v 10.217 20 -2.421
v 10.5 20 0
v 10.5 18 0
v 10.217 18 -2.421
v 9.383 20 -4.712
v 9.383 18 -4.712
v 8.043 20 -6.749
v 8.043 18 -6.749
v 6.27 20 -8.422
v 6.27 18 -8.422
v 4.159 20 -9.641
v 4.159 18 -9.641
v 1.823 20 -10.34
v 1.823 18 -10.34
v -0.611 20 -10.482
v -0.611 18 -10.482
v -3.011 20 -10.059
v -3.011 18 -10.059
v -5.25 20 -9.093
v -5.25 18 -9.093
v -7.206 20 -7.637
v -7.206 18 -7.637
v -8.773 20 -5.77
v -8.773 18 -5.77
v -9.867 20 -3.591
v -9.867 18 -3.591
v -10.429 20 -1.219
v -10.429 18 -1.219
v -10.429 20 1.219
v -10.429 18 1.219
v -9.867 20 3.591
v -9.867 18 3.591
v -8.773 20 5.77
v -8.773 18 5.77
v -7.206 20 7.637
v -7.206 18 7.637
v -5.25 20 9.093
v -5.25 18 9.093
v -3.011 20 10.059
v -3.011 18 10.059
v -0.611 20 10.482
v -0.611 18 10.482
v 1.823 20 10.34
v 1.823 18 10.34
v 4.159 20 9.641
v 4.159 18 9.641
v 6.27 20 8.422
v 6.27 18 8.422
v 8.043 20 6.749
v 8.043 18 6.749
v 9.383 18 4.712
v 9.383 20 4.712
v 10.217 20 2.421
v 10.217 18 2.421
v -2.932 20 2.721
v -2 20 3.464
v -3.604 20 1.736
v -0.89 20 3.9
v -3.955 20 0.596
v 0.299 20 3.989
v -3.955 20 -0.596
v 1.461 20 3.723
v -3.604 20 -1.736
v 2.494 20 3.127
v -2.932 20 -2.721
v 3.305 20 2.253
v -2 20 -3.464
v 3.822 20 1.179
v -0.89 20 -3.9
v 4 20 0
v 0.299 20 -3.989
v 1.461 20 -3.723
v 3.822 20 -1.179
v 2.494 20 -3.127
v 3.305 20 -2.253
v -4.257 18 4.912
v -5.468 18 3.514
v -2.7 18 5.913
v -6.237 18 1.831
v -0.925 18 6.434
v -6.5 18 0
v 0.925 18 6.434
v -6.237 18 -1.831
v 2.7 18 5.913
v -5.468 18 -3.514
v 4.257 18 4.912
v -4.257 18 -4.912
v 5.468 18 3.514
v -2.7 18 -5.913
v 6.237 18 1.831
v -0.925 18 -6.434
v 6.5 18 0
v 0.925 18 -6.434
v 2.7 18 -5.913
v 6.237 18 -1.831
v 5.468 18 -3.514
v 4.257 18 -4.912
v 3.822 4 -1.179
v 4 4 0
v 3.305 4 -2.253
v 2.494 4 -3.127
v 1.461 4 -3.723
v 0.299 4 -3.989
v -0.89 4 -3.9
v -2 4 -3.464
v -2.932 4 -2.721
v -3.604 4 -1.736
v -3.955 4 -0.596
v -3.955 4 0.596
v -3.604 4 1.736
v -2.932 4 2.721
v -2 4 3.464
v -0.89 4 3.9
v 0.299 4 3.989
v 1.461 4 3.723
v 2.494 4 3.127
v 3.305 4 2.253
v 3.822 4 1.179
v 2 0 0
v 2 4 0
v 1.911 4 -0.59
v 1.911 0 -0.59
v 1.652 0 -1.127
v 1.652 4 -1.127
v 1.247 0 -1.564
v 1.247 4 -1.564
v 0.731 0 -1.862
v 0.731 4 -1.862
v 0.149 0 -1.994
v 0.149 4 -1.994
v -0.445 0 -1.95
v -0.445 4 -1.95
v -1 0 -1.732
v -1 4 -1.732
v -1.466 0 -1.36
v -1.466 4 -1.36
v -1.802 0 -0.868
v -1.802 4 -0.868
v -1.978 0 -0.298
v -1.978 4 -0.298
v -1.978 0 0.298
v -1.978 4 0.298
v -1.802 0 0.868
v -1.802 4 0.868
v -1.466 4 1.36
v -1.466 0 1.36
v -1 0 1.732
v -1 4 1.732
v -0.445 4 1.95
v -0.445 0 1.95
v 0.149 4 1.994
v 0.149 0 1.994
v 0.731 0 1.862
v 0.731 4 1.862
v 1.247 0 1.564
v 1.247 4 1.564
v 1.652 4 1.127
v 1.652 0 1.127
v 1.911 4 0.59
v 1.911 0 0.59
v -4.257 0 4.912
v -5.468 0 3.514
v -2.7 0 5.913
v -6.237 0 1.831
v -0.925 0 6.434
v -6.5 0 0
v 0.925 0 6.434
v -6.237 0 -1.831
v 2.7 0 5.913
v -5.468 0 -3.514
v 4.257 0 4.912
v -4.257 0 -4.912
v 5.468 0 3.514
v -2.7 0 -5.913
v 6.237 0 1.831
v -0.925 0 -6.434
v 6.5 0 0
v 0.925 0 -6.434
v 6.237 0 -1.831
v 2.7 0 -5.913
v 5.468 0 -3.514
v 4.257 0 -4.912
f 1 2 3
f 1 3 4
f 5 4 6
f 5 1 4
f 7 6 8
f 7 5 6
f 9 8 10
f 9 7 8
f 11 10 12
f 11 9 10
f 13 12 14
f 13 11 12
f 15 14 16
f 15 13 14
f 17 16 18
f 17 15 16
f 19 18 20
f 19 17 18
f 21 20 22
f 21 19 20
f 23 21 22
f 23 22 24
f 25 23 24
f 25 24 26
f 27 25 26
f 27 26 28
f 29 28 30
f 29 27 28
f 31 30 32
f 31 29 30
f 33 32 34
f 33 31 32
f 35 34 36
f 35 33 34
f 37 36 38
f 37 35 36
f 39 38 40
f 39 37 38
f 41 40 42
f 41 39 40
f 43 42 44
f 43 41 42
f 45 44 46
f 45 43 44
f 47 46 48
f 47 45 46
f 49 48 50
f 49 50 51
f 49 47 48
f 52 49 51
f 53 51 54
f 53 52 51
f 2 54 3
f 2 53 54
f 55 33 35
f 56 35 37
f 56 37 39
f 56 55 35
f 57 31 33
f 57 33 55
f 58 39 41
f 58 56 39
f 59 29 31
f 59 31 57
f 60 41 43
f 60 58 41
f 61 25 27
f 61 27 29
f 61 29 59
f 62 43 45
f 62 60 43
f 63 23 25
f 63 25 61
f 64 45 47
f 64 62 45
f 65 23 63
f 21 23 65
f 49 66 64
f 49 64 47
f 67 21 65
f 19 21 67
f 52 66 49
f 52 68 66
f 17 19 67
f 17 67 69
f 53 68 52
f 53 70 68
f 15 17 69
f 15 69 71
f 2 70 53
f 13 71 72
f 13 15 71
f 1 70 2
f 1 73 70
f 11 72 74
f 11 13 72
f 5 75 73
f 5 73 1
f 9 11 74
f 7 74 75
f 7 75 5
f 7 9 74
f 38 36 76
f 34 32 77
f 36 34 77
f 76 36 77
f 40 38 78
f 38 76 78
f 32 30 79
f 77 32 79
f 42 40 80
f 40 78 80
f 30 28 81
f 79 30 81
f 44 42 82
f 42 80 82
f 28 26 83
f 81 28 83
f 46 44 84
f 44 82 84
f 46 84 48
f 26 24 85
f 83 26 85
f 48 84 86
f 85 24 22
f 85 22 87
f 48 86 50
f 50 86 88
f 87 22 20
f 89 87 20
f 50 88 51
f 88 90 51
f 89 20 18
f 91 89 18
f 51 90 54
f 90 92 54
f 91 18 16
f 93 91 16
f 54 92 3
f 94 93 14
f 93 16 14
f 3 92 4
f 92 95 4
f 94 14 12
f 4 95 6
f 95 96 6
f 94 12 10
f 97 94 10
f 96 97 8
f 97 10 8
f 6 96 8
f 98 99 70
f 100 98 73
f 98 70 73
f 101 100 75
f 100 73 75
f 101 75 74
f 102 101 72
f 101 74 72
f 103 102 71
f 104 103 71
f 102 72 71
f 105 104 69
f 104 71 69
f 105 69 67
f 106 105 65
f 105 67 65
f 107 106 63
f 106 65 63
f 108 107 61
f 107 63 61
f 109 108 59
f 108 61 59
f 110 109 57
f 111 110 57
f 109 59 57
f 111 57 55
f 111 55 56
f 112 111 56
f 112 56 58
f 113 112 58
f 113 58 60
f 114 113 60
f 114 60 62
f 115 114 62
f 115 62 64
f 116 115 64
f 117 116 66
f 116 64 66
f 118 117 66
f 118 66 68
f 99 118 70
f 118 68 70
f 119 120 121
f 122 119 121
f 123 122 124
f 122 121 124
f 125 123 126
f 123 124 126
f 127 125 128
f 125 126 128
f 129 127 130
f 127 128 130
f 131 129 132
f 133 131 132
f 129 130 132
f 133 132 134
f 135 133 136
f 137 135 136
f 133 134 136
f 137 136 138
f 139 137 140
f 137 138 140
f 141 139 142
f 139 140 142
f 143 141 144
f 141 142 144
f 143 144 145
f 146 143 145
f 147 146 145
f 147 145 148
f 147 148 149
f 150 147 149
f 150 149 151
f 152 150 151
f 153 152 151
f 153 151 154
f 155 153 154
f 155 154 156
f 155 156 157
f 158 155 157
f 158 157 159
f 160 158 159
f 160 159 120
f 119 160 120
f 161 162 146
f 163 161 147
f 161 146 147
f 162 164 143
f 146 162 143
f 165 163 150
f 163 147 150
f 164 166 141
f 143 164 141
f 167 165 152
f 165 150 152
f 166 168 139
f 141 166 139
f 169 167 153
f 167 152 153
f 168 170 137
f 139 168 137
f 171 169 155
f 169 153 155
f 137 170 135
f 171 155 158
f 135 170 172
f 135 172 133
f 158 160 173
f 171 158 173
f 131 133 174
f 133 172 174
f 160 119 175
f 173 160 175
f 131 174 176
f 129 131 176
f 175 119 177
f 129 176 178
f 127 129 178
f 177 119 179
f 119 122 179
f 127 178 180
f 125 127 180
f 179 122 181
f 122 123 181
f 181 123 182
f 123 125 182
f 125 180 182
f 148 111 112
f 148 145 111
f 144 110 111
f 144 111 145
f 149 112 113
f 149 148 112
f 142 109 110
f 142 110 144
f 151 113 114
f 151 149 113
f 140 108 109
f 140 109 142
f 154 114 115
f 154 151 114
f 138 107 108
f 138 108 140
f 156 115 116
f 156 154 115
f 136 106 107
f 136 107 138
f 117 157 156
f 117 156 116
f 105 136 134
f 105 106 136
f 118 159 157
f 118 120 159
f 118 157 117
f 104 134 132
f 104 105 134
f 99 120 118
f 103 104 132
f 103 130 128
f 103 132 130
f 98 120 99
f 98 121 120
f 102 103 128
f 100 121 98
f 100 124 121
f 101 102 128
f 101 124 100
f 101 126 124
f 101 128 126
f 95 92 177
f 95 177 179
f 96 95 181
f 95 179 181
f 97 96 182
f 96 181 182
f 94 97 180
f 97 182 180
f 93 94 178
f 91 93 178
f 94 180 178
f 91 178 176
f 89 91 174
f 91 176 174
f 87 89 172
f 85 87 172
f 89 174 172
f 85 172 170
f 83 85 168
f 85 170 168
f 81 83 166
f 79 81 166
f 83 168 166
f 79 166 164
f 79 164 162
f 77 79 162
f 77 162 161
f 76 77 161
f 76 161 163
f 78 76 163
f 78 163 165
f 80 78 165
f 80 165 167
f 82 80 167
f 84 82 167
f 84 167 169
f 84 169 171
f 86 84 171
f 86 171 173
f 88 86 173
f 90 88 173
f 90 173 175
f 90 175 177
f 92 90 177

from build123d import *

# Parameters (mm, degrees)
SKETCH1_R           = 6.5
BOSS_EXTRUDE1_DEPTH = 20
SKETCH2_R           = 4
CUT_EXTRUDE1_DEPTH  = 16
SKETCH3_R           = 2
CUT_EXTRUDE2_DEPTH  = 5
SKETCH4_R           = 10.5
SKETCH4_R_2         = 6.5
BOSS_EXTRUDE2_DEPTH = 2


with BuildPart() as part:
    # Sketch1 → Boss-Extrude1 (new body)
    with BuildSketch(Plane(origin=(0, 0, 0), x_dir=(1, 0, 0), z_dir=(0, 1, 0))):
        Circle(SKETCH1_R)
    extrude(amount=BOSS_EXTRUDE1_DEPTH)

    # Sketch2 → Cut-Extrude1 (cut)
    with BuildSketch(Plane(origin=(0, 20, 0), x_dir=(1, 0, 0), z_dir=(0, 1, 0))):
        Circle(SKETCH2_R)
    extrude(amount=-CUT_EXTRUDE1_DEPTH, mode=Mode.SUBTRACT)

    # Sketch3 → Cut-Extrude2 (cut, through all)
    with BuildSketch(Plane(origin=(0, 4, 0), x_dir=(1, 0, 0), z_dir=(0, 1, 0))):
        Circle(SKETCH3_R)
    extrude(amount=-CUT_EXTRUDE2_DEPTH, mode=Mode.SUBTRACT)

    # Sketch4 → Boss-Extrude2 (add)
    with BuildSketch(Plane(origin=(0, 20, 0), x_dir=(1, 0, 0), z_dir=(0, 1, 0))):
        Circle(SKETCH4_R)
        Circle(SKETCH4_R_2, mode=Mode.SUBTRACT)
    extrude(amount=-BOSS_EXTRUDE2_DEPTH)


solid = part.part
